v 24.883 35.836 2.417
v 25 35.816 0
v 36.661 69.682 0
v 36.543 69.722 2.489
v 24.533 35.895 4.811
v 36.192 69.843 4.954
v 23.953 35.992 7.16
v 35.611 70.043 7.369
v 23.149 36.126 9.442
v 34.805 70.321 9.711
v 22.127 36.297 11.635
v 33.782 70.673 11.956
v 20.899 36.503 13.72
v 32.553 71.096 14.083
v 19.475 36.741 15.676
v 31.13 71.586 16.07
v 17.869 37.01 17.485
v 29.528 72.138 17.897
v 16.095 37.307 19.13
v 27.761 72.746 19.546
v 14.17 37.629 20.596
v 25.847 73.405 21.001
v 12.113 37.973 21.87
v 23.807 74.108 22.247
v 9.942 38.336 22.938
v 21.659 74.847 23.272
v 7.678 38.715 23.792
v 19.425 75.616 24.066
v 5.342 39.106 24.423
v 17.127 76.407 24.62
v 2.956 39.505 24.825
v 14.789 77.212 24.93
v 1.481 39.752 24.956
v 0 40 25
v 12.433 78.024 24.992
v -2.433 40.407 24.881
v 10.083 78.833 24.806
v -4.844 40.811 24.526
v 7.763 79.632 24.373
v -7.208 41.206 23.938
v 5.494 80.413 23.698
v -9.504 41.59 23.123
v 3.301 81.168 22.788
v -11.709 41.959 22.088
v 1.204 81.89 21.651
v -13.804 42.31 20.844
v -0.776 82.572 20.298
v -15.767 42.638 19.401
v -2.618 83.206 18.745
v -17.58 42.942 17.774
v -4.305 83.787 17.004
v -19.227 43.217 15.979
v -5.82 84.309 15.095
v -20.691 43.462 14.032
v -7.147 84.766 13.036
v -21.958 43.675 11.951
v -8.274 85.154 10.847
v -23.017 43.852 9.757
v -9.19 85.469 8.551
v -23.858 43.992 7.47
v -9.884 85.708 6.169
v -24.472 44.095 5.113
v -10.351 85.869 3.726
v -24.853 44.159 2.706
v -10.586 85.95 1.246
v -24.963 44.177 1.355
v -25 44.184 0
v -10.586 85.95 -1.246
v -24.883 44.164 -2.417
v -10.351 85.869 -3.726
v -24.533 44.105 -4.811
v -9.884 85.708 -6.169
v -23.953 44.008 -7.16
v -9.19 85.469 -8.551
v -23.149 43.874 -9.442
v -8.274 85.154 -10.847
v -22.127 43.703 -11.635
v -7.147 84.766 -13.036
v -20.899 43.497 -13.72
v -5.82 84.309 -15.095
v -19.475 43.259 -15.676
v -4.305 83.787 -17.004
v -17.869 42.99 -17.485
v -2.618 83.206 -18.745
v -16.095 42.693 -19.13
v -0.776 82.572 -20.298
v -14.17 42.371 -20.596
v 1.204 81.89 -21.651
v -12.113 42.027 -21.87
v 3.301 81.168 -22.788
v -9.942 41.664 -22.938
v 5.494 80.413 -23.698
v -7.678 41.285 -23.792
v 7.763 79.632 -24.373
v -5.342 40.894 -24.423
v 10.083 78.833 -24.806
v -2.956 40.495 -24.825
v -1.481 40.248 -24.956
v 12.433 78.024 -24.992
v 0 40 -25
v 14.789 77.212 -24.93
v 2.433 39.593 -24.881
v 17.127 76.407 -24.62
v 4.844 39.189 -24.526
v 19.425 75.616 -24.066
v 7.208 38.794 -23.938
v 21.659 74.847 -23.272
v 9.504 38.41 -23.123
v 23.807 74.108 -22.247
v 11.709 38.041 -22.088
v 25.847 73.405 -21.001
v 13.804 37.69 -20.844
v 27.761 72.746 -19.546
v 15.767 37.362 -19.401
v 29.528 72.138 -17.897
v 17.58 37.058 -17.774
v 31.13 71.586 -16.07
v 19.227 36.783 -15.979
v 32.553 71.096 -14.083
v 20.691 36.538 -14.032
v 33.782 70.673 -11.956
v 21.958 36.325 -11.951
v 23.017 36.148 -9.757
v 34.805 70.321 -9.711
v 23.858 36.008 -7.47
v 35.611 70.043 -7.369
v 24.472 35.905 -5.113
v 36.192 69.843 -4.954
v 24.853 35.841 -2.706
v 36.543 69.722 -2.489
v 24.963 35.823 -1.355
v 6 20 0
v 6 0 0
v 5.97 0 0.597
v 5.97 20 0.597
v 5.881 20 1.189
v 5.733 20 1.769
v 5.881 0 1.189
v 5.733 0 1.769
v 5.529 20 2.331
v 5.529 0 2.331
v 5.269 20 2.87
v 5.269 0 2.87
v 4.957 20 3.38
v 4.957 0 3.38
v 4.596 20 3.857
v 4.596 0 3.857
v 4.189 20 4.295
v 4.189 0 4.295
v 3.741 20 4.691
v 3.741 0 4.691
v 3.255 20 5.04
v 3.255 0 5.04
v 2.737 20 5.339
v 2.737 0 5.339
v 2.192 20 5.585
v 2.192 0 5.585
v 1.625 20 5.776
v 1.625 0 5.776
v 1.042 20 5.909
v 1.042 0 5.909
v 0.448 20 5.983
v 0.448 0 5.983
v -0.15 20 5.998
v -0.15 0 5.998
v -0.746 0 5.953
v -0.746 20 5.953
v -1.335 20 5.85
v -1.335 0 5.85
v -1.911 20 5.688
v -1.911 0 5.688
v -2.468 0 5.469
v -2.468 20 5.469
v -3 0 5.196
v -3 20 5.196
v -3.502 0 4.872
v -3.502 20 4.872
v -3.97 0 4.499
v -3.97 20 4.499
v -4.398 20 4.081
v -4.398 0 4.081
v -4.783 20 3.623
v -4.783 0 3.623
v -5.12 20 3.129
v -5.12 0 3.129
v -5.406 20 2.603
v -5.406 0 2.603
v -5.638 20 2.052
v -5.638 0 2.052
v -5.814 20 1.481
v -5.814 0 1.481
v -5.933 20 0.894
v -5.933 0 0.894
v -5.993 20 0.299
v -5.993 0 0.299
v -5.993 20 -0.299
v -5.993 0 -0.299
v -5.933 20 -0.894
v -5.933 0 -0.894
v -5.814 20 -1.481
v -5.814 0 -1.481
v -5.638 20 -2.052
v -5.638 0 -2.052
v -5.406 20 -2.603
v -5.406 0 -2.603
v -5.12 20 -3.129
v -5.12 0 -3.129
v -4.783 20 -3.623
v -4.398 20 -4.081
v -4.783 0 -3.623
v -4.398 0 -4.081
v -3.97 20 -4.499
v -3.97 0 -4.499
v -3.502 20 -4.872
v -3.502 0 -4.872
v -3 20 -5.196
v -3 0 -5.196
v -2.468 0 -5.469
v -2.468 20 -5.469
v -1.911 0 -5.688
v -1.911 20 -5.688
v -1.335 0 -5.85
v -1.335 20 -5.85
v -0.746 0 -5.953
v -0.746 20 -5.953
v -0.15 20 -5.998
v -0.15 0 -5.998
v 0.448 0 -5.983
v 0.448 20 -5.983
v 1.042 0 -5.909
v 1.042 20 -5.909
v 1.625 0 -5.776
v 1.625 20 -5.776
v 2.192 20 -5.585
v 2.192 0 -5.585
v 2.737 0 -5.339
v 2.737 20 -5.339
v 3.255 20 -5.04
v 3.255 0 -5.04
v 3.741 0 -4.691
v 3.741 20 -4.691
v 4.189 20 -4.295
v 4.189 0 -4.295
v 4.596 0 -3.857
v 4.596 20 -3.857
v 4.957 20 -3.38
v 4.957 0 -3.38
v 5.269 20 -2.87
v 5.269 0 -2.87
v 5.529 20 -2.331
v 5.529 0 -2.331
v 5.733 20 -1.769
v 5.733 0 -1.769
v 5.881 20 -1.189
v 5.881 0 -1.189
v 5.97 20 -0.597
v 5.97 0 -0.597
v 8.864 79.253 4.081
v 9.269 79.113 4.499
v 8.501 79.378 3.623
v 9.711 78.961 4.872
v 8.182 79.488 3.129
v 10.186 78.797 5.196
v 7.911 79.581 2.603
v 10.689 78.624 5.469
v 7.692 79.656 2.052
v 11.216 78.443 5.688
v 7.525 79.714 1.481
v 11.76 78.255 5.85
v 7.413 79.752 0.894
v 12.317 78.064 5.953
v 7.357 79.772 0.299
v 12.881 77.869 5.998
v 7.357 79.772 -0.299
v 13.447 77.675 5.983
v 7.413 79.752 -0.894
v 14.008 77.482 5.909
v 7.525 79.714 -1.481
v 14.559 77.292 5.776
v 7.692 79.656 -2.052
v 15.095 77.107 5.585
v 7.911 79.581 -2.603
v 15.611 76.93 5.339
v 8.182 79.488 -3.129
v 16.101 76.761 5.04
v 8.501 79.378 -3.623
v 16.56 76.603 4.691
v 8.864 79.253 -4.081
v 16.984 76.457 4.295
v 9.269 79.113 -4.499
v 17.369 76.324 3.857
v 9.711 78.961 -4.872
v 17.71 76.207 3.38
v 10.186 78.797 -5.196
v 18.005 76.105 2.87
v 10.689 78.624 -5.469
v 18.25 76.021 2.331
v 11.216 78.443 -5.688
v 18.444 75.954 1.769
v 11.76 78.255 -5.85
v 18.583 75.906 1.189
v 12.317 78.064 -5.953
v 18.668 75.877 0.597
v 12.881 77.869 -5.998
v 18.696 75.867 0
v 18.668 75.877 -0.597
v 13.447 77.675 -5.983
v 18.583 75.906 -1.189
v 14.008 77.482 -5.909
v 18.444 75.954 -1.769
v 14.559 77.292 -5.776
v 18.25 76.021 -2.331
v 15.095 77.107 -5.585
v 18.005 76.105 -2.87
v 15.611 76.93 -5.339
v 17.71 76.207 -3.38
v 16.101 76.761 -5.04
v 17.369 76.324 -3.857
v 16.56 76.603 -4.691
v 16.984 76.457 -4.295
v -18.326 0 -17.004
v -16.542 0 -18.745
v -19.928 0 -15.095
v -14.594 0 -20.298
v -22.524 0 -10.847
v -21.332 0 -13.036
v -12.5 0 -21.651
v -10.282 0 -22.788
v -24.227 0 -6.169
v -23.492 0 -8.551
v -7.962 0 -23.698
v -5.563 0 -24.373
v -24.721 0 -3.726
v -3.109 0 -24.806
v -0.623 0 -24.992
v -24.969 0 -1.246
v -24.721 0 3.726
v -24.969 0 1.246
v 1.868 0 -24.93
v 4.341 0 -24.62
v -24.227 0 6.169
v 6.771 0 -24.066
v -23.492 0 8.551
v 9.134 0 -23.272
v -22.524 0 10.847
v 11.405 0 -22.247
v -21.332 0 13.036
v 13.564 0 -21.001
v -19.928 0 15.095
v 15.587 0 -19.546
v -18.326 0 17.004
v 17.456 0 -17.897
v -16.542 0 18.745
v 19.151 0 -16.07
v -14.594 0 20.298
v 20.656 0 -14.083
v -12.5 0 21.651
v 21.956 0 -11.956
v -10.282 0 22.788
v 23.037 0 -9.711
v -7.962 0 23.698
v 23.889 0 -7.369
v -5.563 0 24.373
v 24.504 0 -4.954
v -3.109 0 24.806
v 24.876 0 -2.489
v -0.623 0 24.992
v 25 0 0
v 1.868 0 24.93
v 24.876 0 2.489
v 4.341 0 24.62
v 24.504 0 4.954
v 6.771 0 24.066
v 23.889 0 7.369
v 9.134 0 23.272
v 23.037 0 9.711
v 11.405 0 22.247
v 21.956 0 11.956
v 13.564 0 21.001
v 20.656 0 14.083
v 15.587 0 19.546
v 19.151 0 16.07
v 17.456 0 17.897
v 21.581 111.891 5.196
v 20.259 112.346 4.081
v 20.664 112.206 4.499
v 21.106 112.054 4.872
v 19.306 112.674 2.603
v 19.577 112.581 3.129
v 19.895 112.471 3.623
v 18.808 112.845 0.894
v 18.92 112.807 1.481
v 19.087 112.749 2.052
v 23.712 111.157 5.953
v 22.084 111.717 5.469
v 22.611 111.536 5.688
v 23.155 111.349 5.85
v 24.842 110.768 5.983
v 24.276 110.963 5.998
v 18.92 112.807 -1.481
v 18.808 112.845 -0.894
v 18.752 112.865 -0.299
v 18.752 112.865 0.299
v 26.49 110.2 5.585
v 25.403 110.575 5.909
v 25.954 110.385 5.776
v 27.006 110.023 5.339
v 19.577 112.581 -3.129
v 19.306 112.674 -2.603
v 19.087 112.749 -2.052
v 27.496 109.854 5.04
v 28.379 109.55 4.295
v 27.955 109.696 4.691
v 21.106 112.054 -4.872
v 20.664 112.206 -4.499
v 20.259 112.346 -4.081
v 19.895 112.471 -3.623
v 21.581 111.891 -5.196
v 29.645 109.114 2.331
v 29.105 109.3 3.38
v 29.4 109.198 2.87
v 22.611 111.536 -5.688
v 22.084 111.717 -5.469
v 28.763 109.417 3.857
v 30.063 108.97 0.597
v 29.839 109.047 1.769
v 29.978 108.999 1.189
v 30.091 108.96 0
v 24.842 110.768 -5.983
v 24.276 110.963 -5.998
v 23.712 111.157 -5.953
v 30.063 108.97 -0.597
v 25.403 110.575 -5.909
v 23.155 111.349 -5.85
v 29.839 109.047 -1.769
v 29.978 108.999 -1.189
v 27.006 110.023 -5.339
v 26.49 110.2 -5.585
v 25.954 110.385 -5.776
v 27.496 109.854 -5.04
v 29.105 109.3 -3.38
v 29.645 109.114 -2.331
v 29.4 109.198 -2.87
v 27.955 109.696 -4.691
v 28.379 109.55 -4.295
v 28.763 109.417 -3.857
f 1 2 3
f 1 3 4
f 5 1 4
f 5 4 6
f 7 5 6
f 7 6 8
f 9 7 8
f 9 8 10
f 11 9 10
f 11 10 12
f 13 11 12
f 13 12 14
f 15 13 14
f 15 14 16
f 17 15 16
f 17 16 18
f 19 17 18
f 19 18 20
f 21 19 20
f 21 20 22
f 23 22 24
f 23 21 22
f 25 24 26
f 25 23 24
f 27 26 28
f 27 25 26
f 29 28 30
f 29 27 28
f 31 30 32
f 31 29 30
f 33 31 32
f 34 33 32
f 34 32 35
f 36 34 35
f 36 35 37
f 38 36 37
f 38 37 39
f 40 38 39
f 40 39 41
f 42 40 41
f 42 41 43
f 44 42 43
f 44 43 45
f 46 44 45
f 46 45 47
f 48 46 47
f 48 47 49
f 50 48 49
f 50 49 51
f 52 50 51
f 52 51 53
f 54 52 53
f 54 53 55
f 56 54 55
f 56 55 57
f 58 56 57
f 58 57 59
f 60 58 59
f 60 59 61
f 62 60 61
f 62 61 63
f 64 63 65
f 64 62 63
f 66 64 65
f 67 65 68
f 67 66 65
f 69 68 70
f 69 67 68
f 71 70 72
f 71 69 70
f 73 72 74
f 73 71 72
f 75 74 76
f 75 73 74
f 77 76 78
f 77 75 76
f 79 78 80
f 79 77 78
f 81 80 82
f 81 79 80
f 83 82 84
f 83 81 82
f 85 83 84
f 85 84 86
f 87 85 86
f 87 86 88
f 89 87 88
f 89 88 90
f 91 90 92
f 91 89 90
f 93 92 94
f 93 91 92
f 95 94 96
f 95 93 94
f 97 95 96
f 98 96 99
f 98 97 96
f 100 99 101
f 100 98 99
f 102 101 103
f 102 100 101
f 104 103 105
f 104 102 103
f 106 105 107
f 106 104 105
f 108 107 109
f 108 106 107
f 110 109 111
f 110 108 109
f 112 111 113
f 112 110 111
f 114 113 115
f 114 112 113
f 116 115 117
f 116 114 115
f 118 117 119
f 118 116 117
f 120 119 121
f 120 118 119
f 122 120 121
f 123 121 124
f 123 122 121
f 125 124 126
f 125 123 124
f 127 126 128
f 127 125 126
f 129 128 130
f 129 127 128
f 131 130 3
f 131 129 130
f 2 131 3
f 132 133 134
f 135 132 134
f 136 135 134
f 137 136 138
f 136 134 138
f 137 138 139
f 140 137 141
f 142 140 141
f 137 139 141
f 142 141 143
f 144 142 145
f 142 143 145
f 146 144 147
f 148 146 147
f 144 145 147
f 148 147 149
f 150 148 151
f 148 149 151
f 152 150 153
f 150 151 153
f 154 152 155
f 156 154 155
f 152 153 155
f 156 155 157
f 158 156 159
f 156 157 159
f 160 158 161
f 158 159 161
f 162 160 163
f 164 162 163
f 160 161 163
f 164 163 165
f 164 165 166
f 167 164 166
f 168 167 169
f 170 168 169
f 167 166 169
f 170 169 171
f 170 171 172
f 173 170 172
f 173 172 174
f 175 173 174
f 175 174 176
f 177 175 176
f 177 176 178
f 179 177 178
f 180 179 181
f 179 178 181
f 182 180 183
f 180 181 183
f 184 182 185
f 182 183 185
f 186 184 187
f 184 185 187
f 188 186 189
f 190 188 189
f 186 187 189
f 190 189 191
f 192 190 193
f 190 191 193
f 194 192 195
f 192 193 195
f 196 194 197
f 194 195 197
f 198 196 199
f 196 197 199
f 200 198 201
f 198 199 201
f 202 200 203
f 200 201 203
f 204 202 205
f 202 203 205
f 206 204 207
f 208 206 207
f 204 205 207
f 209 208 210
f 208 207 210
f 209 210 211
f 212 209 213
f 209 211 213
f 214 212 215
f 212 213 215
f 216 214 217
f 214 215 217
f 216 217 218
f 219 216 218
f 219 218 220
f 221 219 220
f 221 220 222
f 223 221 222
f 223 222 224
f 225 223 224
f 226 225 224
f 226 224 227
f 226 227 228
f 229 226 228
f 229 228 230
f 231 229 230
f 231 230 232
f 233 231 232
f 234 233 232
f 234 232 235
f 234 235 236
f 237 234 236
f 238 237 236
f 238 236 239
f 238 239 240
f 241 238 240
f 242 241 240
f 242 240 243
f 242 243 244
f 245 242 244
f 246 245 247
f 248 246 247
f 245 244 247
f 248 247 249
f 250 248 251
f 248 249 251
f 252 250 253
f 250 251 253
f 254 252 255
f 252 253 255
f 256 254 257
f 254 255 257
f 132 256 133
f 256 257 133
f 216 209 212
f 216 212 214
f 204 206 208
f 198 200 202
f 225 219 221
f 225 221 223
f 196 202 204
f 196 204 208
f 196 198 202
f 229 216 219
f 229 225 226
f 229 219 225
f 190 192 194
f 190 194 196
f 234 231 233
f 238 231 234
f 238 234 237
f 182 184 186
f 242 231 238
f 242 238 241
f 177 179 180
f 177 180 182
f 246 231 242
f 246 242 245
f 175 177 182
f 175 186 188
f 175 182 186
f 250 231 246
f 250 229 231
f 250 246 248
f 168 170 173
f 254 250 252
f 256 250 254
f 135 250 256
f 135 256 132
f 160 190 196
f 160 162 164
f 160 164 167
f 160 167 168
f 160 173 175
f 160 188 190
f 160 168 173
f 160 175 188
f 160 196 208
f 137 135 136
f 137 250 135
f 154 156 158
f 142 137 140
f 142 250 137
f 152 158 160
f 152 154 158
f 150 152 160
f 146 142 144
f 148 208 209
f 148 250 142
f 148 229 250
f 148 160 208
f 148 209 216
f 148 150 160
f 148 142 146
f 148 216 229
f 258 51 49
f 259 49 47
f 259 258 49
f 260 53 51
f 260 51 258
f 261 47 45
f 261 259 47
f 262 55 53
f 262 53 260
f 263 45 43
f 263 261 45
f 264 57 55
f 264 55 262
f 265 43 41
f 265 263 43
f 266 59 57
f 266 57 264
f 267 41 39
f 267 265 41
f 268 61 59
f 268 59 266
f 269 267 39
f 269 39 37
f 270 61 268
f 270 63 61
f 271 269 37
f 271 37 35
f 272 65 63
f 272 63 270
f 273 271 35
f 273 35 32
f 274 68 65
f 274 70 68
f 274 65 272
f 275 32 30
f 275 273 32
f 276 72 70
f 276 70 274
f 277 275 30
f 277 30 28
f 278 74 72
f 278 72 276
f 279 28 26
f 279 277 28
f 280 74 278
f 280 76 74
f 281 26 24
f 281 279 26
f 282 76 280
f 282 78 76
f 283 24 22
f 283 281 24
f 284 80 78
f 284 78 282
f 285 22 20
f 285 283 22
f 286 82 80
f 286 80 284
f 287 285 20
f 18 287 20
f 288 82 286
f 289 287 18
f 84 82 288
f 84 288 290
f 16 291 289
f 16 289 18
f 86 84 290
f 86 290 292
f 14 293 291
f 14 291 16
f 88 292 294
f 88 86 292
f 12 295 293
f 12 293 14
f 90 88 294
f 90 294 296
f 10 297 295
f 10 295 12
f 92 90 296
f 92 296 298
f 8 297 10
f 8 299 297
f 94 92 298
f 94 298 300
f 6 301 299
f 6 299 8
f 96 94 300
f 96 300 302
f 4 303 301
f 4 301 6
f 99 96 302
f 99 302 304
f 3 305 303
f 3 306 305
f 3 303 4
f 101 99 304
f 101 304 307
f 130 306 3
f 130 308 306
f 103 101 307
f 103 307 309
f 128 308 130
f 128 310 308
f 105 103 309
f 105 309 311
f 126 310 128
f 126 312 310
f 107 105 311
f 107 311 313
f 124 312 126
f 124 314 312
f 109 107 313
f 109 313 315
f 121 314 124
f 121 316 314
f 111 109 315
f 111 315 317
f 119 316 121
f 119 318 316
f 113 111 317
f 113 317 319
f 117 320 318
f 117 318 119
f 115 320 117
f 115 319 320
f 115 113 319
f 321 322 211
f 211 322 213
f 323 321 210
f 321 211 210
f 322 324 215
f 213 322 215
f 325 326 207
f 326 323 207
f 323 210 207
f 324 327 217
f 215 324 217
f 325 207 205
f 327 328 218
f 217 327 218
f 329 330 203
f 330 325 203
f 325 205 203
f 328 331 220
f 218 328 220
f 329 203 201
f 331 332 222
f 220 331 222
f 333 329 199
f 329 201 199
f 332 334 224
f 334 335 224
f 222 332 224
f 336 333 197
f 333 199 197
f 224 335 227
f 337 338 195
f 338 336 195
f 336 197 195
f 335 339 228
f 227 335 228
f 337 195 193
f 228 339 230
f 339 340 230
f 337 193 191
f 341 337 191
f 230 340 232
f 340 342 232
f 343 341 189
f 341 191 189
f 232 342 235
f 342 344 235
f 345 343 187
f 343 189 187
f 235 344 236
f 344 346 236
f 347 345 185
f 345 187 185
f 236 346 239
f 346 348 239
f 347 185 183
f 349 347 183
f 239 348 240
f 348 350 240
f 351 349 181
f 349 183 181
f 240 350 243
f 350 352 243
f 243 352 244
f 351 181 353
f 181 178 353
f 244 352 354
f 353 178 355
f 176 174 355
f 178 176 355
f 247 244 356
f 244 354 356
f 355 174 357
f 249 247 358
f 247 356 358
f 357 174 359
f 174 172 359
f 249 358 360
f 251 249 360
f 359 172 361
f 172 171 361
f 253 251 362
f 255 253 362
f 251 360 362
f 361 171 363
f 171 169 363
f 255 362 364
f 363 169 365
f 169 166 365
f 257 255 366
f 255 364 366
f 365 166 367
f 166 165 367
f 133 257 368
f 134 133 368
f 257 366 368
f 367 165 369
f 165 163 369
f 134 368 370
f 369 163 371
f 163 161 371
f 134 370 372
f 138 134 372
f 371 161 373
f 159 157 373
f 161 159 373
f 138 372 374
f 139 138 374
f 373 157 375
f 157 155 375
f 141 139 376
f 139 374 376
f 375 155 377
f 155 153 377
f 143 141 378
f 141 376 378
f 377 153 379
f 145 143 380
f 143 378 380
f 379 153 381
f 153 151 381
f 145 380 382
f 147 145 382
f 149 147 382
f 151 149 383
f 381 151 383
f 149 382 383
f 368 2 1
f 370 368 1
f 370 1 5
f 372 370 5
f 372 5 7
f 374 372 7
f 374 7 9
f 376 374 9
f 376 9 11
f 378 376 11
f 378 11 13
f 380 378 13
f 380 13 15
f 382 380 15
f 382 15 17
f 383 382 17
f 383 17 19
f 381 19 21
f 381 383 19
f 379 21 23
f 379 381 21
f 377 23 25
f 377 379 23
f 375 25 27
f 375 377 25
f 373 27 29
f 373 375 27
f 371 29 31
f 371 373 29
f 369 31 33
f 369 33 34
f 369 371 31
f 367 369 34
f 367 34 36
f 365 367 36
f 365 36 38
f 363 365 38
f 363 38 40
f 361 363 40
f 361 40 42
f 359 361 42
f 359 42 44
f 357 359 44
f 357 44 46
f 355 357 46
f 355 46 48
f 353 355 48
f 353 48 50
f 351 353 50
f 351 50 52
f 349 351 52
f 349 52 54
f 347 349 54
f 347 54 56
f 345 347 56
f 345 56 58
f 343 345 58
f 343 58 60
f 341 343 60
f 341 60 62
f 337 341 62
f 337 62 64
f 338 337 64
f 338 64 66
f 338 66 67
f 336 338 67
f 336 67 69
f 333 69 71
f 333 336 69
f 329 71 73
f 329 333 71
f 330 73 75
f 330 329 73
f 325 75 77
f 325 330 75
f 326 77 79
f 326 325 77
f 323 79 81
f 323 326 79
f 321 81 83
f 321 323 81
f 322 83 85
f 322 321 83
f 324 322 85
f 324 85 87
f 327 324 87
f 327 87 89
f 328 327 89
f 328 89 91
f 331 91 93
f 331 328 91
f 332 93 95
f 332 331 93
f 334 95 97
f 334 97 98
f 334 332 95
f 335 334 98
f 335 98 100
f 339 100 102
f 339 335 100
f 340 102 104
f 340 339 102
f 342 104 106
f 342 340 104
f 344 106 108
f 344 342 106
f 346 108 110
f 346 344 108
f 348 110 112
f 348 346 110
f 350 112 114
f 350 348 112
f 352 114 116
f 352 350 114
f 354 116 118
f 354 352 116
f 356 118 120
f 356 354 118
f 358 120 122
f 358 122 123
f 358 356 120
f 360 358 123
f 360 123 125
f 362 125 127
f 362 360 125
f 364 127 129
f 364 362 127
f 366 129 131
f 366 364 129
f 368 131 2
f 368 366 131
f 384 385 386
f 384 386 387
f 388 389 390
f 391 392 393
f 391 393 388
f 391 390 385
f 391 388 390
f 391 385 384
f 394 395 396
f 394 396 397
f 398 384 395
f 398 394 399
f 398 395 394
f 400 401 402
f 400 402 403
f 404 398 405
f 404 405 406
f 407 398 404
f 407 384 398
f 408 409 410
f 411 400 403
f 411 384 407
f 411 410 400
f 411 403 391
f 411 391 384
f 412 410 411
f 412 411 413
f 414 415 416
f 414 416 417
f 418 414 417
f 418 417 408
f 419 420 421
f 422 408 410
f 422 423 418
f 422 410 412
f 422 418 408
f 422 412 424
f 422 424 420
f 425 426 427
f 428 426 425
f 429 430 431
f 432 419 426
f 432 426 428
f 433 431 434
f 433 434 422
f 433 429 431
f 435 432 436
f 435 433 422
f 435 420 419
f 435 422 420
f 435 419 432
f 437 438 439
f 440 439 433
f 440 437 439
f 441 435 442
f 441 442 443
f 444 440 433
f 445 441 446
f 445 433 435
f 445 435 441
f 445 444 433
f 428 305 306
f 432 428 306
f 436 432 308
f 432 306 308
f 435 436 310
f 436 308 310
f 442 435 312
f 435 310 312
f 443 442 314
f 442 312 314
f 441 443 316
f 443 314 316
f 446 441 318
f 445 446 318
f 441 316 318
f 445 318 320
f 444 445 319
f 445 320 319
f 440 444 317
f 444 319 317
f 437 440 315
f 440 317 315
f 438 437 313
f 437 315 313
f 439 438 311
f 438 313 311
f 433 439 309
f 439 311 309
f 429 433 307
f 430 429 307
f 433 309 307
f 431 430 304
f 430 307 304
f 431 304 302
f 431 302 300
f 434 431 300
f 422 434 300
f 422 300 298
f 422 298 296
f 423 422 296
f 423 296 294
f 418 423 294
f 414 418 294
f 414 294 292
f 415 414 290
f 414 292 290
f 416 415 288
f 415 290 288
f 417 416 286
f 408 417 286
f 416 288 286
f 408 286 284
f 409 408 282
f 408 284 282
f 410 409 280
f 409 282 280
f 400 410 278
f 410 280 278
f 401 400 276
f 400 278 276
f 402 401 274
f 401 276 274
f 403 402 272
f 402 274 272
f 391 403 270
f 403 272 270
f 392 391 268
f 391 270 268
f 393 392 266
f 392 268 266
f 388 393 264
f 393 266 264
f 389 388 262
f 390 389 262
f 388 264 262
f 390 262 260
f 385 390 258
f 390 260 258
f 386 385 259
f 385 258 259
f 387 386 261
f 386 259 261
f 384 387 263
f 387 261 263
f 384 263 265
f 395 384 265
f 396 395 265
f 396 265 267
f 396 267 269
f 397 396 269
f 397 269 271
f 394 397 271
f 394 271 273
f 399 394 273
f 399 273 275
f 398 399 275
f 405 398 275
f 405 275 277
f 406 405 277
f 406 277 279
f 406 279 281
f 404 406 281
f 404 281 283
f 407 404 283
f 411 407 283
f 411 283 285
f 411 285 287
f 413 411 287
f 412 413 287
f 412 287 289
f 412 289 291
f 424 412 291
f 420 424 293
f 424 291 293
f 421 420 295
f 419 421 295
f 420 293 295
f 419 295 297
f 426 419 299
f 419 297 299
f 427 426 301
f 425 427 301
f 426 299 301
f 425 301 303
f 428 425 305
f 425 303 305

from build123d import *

# Parameters (mm, degrees)
ESBO_O2_R                = 25
ESBO_O3_R                = 6
RESSALTO_EXTRUS_O1_DEPTH = 35
ESBO_O4_R                = 6
CORTE_EXTRUS_O1_DEPTH    = 20


with BuildPart() as part:
    # Varredura1: sweep along a path in Esboço1
    with BuildLine(Plane.XY) as varredura1_path:
        Line((13.022726178, 77.820743024), (0, 40))
        Line((0, 40), (0, 0))
    # Esboço2 → Varredura1 (sweep)
    with BuildSketch(Plane(origin=(0, 0, 0), x_dir=(1, 0, 0), z_dir=(0, 1, 0))):
        Circle(ESBO_O2_R)
    sweep(path=varredura1_path.line, transition=Transition.RIGHT)

    # Esboço3 → Ressalto-extrusão1 (add)
    with BuildSketch(Plane(origin=(25.335955685, 73.580958096, 0), x_dir=(0.945518576, -0.325568154, 0), z_dir=(0.325568154, 0.945518576, 0))):
        with Locations((-13.022726178, 0)):
            Circle(ESBO_O3_R)
    extrude(amount=RESSALTO_EXTRUS_O1_DEPTH)

    # Esboço4 → Corte-extrusão1 (cut)
    with BuildSketch(Plane.XZ):
        Circle(ESBO_O4_R)
    extrude(amount=-CORTE_EXTRUS_O1_DEPTH, mode=Mode.SUBTRACT)


solid = part.part
